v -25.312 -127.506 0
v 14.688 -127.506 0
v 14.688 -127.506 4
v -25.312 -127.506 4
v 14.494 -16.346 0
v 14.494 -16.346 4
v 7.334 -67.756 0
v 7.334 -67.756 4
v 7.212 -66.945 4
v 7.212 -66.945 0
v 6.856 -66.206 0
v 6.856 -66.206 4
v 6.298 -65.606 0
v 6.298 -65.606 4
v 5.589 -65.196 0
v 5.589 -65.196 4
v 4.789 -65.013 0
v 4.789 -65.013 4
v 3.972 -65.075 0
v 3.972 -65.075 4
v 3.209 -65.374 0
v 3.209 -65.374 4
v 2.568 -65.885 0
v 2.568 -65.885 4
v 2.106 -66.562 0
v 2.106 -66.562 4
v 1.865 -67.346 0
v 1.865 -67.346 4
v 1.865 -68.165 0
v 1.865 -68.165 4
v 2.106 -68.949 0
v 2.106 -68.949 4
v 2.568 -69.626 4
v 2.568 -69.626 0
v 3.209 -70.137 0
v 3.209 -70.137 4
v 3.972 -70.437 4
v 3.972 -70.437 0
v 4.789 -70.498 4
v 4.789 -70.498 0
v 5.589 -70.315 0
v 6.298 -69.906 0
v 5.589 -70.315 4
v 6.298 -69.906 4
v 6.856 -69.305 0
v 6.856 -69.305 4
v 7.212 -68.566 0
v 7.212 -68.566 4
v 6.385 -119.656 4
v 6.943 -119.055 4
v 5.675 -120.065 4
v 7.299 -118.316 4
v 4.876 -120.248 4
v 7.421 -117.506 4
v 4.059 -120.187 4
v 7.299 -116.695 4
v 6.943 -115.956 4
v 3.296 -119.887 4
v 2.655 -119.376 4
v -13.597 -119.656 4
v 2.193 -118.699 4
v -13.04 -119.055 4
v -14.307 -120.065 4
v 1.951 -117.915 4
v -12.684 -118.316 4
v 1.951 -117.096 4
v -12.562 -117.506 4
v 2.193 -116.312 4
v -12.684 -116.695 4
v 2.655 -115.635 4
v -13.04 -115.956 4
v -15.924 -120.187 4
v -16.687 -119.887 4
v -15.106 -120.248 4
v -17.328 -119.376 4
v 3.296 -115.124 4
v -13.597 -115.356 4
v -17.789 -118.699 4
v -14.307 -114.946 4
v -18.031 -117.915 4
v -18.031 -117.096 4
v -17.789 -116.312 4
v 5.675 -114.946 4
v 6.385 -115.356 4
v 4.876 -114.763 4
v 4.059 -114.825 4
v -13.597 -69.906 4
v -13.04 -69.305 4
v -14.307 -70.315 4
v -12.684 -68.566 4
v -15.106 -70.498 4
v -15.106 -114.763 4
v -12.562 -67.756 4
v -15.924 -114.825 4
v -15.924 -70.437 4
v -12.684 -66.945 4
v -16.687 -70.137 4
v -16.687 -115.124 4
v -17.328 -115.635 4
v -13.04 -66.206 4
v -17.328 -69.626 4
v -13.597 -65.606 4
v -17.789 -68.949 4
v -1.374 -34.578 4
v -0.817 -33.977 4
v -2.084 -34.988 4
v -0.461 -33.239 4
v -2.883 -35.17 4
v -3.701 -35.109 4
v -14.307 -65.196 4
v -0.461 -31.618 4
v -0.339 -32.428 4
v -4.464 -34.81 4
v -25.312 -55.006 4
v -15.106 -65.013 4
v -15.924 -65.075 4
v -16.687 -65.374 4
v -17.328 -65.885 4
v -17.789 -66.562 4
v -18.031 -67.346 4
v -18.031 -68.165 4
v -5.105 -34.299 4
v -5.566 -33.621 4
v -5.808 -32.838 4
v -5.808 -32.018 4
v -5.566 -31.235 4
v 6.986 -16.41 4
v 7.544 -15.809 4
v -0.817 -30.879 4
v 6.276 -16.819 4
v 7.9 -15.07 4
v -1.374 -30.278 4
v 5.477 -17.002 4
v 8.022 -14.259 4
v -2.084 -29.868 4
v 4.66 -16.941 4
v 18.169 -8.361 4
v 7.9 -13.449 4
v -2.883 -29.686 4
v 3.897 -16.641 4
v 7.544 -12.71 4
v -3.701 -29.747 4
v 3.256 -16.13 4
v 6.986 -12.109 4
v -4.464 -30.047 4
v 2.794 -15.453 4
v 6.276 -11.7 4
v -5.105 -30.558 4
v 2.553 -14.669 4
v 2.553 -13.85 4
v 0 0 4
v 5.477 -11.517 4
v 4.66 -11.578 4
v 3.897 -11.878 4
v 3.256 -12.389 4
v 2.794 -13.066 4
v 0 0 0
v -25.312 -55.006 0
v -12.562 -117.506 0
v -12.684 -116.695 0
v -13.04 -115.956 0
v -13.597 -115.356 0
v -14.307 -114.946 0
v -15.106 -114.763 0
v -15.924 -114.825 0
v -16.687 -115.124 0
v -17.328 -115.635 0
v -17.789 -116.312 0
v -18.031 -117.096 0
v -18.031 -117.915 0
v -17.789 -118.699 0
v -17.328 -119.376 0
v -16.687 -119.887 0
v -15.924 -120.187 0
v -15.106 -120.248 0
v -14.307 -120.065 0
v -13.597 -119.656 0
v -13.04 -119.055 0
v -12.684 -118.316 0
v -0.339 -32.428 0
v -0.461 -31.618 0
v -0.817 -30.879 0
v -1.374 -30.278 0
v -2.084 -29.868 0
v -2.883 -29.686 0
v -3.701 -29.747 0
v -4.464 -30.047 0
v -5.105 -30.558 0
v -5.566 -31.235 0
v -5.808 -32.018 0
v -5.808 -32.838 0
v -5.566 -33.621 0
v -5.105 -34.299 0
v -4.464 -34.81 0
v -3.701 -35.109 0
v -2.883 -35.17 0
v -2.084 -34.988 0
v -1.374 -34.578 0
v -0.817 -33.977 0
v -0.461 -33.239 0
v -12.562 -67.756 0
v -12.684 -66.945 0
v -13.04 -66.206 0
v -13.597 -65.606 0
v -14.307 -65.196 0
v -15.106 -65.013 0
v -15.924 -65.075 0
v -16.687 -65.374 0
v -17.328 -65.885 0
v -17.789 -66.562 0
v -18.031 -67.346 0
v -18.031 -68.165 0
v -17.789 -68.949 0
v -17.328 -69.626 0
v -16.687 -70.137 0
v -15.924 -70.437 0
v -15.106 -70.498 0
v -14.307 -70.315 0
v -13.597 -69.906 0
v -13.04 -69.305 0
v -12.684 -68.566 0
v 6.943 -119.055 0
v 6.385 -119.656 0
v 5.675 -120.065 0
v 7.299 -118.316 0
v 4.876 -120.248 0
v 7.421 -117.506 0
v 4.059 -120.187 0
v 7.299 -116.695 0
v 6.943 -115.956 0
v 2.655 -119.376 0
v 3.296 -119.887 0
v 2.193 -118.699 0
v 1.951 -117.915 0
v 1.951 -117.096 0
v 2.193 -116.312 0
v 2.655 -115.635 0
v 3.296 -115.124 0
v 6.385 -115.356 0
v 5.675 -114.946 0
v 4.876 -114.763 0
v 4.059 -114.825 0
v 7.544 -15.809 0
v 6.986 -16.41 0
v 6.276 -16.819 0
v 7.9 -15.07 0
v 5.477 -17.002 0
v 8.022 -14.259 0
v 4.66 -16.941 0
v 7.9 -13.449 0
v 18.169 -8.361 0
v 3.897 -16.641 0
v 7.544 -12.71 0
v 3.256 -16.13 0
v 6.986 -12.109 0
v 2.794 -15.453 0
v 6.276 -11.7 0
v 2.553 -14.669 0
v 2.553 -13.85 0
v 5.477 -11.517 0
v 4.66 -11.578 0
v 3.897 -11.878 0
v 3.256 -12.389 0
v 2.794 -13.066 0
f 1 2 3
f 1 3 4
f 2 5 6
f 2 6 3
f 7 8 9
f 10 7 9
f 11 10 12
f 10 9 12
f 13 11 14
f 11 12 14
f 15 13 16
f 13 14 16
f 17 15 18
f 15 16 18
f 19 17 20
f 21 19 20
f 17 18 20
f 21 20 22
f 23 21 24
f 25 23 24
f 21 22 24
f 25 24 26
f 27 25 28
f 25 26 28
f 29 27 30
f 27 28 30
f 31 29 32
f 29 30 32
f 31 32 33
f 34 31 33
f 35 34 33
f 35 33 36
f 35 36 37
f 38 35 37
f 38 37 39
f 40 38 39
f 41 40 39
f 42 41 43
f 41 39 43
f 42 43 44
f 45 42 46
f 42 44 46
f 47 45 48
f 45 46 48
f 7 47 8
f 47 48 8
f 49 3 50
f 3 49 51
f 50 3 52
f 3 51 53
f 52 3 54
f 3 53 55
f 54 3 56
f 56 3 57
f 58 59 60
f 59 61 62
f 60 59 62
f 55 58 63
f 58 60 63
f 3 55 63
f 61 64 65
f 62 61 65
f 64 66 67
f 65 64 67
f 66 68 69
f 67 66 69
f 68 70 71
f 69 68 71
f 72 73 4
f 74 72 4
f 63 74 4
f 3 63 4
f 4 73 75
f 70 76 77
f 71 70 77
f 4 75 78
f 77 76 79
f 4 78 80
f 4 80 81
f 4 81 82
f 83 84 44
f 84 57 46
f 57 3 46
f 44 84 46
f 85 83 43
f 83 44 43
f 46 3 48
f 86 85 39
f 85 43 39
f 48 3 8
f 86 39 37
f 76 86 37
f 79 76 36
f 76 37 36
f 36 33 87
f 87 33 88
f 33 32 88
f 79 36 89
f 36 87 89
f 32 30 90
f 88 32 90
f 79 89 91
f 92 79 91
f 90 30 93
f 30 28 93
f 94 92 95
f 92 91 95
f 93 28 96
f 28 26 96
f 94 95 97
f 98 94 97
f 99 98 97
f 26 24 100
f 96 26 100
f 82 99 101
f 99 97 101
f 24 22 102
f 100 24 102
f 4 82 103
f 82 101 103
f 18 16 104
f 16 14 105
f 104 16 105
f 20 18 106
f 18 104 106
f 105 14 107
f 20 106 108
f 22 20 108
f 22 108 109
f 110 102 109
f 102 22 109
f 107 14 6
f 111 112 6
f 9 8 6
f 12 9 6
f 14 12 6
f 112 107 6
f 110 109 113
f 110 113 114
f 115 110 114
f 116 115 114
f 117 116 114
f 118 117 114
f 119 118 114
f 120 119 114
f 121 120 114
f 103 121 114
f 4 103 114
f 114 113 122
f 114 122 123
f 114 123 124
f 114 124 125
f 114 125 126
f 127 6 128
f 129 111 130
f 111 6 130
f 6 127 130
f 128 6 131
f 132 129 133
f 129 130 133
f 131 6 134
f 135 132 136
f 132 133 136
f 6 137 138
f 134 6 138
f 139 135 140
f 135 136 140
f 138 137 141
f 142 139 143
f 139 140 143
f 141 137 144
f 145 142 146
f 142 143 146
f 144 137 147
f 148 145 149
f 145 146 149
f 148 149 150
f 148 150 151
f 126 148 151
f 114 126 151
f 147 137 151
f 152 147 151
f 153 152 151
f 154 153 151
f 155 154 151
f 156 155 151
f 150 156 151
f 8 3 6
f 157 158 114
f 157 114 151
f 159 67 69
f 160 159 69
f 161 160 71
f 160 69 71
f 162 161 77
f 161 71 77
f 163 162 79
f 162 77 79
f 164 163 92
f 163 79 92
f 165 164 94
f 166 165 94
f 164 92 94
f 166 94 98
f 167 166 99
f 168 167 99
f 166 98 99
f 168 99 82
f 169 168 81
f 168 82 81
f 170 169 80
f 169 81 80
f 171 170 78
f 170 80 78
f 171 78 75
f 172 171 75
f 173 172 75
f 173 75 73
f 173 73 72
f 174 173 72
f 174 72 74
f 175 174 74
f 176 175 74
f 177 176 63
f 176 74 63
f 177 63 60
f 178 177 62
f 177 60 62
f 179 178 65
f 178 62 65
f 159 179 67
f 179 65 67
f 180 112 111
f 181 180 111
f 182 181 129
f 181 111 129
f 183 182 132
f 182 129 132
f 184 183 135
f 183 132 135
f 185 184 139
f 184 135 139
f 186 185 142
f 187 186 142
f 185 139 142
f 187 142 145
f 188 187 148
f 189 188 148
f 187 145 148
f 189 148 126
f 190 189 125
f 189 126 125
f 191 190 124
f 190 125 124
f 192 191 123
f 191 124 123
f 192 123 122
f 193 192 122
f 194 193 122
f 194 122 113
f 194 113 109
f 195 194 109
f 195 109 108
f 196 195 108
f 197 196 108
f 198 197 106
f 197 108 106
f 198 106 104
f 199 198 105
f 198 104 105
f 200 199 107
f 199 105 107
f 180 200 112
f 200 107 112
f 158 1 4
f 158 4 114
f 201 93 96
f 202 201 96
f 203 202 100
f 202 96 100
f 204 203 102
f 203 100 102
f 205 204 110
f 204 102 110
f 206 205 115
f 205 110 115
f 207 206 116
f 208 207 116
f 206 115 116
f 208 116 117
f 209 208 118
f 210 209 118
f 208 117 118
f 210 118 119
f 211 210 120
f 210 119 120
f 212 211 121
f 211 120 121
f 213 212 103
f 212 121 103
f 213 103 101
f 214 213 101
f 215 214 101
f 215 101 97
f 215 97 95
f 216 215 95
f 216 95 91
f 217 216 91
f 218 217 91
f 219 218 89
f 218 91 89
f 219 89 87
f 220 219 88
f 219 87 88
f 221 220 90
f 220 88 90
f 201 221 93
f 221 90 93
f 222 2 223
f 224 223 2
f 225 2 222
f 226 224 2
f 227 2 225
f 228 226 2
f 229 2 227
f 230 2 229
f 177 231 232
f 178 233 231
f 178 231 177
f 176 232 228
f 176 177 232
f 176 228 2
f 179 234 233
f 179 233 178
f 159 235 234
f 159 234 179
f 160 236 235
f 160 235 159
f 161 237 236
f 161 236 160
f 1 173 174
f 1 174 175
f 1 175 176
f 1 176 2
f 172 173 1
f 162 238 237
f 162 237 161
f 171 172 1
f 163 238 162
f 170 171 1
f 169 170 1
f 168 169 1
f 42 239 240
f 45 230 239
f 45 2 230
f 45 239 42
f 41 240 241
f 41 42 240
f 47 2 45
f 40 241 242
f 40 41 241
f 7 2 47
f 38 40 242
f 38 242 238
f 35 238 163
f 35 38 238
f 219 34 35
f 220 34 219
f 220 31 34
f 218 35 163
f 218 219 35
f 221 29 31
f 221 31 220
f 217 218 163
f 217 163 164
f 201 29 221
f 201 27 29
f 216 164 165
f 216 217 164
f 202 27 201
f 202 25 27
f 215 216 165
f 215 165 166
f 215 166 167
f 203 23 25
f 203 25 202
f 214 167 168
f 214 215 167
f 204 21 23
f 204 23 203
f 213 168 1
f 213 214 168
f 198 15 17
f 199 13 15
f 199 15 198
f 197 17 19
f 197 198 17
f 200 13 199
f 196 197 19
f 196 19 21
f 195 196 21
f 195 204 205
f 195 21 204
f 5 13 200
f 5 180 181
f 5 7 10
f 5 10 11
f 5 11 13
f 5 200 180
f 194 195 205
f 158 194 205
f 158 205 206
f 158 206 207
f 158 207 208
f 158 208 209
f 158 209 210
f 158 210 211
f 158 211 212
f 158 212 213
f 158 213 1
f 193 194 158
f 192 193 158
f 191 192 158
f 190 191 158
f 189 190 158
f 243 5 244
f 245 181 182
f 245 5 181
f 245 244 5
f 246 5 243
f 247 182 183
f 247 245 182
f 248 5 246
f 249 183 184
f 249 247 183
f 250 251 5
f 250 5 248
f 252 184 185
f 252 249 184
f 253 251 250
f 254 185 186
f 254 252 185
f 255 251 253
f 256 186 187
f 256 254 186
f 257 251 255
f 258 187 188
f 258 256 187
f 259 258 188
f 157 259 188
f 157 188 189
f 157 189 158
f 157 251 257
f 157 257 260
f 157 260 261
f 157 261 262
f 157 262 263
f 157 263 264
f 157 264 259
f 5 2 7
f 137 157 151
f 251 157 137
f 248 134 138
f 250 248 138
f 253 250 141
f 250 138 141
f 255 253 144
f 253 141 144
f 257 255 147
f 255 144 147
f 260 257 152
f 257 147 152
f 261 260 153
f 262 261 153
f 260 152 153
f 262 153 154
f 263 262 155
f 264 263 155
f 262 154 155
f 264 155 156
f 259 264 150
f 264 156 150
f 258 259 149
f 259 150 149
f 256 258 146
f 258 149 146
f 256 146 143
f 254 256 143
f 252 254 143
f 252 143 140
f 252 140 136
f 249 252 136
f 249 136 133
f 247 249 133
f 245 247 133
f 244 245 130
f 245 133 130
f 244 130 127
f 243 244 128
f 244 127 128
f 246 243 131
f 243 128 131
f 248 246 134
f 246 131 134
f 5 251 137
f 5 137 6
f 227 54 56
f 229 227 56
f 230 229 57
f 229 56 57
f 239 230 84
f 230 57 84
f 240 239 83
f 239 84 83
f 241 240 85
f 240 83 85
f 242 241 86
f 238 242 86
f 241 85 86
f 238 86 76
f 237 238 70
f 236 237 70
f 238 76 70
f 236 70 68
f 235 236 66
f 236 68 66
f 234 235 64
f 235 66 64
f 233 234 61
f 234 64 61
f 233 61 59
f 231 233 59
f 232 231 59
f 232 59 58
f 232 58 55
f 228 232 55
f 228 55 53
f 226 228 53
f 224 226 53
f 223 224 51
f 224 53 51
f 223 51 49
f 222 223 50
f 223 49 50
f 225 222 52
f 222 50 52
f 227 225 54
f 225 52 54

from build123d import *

# Parameters (mm, degrees)
BOSS_EXTRUDE1_DEPTH = 4
SKETCH2_R           = 2.75
CUT_EXTRUDE1_DEPTH  = 4
SKETCH3_R           = 2.75
CUT_EXTRUDE2_DEPTH  = 4


with BuildPart() as part:
    # Sketch1 → Boss-Extrude1 (new body)
    with BuildSketch(Plane.XY):
        Polygon((0, 0), (18.168649127, -8.360633284), (14.494150799, -16.345754575), (14.688182734, -127.505585232), (-25.311817266, -127.505585232), (-25.311817266, -55.005585232), align=None)
    extrude(amount=BOSS_EXTRUDE1_DEPTH)

    # Sketch2 → Cut-Extrude1 (cut)
    with BuildSketch(Plane.XY.offset(4)):
        with Locations((-15.311817266, -117.505585232)):
            Circle(SKETCH2_R)
        with Locations((4.670712279, -117.505585232)):
            Circle(SKETCH2_R)
        with Locations((-15.311817266, -67.755585232)):
            Circle(SKETCH2_R)
        with Locations((4.583872557, -67.755585232)):
            Circle(SKETCH2_R)
    extrude(amount=-CUT_EXTRUDE1_DEPTH, mode=Mode.SUBTRACT)

    # Sketch3 → Cut-Extrude2 (cut)
    with BuildSketch(Plane.XY.offset(4)):
        with Locations((5.271808516, -14.259489296)):
            Circle(SKETCH3_R)
        with Locations((-3.088824768, -32.428138423)):
            Circle(SKETCH3_R)
    extrude(amount=-CUT_EXTRUDE2_DEPTH, mode=Mode.SUBTRACT)


solid = part.part
